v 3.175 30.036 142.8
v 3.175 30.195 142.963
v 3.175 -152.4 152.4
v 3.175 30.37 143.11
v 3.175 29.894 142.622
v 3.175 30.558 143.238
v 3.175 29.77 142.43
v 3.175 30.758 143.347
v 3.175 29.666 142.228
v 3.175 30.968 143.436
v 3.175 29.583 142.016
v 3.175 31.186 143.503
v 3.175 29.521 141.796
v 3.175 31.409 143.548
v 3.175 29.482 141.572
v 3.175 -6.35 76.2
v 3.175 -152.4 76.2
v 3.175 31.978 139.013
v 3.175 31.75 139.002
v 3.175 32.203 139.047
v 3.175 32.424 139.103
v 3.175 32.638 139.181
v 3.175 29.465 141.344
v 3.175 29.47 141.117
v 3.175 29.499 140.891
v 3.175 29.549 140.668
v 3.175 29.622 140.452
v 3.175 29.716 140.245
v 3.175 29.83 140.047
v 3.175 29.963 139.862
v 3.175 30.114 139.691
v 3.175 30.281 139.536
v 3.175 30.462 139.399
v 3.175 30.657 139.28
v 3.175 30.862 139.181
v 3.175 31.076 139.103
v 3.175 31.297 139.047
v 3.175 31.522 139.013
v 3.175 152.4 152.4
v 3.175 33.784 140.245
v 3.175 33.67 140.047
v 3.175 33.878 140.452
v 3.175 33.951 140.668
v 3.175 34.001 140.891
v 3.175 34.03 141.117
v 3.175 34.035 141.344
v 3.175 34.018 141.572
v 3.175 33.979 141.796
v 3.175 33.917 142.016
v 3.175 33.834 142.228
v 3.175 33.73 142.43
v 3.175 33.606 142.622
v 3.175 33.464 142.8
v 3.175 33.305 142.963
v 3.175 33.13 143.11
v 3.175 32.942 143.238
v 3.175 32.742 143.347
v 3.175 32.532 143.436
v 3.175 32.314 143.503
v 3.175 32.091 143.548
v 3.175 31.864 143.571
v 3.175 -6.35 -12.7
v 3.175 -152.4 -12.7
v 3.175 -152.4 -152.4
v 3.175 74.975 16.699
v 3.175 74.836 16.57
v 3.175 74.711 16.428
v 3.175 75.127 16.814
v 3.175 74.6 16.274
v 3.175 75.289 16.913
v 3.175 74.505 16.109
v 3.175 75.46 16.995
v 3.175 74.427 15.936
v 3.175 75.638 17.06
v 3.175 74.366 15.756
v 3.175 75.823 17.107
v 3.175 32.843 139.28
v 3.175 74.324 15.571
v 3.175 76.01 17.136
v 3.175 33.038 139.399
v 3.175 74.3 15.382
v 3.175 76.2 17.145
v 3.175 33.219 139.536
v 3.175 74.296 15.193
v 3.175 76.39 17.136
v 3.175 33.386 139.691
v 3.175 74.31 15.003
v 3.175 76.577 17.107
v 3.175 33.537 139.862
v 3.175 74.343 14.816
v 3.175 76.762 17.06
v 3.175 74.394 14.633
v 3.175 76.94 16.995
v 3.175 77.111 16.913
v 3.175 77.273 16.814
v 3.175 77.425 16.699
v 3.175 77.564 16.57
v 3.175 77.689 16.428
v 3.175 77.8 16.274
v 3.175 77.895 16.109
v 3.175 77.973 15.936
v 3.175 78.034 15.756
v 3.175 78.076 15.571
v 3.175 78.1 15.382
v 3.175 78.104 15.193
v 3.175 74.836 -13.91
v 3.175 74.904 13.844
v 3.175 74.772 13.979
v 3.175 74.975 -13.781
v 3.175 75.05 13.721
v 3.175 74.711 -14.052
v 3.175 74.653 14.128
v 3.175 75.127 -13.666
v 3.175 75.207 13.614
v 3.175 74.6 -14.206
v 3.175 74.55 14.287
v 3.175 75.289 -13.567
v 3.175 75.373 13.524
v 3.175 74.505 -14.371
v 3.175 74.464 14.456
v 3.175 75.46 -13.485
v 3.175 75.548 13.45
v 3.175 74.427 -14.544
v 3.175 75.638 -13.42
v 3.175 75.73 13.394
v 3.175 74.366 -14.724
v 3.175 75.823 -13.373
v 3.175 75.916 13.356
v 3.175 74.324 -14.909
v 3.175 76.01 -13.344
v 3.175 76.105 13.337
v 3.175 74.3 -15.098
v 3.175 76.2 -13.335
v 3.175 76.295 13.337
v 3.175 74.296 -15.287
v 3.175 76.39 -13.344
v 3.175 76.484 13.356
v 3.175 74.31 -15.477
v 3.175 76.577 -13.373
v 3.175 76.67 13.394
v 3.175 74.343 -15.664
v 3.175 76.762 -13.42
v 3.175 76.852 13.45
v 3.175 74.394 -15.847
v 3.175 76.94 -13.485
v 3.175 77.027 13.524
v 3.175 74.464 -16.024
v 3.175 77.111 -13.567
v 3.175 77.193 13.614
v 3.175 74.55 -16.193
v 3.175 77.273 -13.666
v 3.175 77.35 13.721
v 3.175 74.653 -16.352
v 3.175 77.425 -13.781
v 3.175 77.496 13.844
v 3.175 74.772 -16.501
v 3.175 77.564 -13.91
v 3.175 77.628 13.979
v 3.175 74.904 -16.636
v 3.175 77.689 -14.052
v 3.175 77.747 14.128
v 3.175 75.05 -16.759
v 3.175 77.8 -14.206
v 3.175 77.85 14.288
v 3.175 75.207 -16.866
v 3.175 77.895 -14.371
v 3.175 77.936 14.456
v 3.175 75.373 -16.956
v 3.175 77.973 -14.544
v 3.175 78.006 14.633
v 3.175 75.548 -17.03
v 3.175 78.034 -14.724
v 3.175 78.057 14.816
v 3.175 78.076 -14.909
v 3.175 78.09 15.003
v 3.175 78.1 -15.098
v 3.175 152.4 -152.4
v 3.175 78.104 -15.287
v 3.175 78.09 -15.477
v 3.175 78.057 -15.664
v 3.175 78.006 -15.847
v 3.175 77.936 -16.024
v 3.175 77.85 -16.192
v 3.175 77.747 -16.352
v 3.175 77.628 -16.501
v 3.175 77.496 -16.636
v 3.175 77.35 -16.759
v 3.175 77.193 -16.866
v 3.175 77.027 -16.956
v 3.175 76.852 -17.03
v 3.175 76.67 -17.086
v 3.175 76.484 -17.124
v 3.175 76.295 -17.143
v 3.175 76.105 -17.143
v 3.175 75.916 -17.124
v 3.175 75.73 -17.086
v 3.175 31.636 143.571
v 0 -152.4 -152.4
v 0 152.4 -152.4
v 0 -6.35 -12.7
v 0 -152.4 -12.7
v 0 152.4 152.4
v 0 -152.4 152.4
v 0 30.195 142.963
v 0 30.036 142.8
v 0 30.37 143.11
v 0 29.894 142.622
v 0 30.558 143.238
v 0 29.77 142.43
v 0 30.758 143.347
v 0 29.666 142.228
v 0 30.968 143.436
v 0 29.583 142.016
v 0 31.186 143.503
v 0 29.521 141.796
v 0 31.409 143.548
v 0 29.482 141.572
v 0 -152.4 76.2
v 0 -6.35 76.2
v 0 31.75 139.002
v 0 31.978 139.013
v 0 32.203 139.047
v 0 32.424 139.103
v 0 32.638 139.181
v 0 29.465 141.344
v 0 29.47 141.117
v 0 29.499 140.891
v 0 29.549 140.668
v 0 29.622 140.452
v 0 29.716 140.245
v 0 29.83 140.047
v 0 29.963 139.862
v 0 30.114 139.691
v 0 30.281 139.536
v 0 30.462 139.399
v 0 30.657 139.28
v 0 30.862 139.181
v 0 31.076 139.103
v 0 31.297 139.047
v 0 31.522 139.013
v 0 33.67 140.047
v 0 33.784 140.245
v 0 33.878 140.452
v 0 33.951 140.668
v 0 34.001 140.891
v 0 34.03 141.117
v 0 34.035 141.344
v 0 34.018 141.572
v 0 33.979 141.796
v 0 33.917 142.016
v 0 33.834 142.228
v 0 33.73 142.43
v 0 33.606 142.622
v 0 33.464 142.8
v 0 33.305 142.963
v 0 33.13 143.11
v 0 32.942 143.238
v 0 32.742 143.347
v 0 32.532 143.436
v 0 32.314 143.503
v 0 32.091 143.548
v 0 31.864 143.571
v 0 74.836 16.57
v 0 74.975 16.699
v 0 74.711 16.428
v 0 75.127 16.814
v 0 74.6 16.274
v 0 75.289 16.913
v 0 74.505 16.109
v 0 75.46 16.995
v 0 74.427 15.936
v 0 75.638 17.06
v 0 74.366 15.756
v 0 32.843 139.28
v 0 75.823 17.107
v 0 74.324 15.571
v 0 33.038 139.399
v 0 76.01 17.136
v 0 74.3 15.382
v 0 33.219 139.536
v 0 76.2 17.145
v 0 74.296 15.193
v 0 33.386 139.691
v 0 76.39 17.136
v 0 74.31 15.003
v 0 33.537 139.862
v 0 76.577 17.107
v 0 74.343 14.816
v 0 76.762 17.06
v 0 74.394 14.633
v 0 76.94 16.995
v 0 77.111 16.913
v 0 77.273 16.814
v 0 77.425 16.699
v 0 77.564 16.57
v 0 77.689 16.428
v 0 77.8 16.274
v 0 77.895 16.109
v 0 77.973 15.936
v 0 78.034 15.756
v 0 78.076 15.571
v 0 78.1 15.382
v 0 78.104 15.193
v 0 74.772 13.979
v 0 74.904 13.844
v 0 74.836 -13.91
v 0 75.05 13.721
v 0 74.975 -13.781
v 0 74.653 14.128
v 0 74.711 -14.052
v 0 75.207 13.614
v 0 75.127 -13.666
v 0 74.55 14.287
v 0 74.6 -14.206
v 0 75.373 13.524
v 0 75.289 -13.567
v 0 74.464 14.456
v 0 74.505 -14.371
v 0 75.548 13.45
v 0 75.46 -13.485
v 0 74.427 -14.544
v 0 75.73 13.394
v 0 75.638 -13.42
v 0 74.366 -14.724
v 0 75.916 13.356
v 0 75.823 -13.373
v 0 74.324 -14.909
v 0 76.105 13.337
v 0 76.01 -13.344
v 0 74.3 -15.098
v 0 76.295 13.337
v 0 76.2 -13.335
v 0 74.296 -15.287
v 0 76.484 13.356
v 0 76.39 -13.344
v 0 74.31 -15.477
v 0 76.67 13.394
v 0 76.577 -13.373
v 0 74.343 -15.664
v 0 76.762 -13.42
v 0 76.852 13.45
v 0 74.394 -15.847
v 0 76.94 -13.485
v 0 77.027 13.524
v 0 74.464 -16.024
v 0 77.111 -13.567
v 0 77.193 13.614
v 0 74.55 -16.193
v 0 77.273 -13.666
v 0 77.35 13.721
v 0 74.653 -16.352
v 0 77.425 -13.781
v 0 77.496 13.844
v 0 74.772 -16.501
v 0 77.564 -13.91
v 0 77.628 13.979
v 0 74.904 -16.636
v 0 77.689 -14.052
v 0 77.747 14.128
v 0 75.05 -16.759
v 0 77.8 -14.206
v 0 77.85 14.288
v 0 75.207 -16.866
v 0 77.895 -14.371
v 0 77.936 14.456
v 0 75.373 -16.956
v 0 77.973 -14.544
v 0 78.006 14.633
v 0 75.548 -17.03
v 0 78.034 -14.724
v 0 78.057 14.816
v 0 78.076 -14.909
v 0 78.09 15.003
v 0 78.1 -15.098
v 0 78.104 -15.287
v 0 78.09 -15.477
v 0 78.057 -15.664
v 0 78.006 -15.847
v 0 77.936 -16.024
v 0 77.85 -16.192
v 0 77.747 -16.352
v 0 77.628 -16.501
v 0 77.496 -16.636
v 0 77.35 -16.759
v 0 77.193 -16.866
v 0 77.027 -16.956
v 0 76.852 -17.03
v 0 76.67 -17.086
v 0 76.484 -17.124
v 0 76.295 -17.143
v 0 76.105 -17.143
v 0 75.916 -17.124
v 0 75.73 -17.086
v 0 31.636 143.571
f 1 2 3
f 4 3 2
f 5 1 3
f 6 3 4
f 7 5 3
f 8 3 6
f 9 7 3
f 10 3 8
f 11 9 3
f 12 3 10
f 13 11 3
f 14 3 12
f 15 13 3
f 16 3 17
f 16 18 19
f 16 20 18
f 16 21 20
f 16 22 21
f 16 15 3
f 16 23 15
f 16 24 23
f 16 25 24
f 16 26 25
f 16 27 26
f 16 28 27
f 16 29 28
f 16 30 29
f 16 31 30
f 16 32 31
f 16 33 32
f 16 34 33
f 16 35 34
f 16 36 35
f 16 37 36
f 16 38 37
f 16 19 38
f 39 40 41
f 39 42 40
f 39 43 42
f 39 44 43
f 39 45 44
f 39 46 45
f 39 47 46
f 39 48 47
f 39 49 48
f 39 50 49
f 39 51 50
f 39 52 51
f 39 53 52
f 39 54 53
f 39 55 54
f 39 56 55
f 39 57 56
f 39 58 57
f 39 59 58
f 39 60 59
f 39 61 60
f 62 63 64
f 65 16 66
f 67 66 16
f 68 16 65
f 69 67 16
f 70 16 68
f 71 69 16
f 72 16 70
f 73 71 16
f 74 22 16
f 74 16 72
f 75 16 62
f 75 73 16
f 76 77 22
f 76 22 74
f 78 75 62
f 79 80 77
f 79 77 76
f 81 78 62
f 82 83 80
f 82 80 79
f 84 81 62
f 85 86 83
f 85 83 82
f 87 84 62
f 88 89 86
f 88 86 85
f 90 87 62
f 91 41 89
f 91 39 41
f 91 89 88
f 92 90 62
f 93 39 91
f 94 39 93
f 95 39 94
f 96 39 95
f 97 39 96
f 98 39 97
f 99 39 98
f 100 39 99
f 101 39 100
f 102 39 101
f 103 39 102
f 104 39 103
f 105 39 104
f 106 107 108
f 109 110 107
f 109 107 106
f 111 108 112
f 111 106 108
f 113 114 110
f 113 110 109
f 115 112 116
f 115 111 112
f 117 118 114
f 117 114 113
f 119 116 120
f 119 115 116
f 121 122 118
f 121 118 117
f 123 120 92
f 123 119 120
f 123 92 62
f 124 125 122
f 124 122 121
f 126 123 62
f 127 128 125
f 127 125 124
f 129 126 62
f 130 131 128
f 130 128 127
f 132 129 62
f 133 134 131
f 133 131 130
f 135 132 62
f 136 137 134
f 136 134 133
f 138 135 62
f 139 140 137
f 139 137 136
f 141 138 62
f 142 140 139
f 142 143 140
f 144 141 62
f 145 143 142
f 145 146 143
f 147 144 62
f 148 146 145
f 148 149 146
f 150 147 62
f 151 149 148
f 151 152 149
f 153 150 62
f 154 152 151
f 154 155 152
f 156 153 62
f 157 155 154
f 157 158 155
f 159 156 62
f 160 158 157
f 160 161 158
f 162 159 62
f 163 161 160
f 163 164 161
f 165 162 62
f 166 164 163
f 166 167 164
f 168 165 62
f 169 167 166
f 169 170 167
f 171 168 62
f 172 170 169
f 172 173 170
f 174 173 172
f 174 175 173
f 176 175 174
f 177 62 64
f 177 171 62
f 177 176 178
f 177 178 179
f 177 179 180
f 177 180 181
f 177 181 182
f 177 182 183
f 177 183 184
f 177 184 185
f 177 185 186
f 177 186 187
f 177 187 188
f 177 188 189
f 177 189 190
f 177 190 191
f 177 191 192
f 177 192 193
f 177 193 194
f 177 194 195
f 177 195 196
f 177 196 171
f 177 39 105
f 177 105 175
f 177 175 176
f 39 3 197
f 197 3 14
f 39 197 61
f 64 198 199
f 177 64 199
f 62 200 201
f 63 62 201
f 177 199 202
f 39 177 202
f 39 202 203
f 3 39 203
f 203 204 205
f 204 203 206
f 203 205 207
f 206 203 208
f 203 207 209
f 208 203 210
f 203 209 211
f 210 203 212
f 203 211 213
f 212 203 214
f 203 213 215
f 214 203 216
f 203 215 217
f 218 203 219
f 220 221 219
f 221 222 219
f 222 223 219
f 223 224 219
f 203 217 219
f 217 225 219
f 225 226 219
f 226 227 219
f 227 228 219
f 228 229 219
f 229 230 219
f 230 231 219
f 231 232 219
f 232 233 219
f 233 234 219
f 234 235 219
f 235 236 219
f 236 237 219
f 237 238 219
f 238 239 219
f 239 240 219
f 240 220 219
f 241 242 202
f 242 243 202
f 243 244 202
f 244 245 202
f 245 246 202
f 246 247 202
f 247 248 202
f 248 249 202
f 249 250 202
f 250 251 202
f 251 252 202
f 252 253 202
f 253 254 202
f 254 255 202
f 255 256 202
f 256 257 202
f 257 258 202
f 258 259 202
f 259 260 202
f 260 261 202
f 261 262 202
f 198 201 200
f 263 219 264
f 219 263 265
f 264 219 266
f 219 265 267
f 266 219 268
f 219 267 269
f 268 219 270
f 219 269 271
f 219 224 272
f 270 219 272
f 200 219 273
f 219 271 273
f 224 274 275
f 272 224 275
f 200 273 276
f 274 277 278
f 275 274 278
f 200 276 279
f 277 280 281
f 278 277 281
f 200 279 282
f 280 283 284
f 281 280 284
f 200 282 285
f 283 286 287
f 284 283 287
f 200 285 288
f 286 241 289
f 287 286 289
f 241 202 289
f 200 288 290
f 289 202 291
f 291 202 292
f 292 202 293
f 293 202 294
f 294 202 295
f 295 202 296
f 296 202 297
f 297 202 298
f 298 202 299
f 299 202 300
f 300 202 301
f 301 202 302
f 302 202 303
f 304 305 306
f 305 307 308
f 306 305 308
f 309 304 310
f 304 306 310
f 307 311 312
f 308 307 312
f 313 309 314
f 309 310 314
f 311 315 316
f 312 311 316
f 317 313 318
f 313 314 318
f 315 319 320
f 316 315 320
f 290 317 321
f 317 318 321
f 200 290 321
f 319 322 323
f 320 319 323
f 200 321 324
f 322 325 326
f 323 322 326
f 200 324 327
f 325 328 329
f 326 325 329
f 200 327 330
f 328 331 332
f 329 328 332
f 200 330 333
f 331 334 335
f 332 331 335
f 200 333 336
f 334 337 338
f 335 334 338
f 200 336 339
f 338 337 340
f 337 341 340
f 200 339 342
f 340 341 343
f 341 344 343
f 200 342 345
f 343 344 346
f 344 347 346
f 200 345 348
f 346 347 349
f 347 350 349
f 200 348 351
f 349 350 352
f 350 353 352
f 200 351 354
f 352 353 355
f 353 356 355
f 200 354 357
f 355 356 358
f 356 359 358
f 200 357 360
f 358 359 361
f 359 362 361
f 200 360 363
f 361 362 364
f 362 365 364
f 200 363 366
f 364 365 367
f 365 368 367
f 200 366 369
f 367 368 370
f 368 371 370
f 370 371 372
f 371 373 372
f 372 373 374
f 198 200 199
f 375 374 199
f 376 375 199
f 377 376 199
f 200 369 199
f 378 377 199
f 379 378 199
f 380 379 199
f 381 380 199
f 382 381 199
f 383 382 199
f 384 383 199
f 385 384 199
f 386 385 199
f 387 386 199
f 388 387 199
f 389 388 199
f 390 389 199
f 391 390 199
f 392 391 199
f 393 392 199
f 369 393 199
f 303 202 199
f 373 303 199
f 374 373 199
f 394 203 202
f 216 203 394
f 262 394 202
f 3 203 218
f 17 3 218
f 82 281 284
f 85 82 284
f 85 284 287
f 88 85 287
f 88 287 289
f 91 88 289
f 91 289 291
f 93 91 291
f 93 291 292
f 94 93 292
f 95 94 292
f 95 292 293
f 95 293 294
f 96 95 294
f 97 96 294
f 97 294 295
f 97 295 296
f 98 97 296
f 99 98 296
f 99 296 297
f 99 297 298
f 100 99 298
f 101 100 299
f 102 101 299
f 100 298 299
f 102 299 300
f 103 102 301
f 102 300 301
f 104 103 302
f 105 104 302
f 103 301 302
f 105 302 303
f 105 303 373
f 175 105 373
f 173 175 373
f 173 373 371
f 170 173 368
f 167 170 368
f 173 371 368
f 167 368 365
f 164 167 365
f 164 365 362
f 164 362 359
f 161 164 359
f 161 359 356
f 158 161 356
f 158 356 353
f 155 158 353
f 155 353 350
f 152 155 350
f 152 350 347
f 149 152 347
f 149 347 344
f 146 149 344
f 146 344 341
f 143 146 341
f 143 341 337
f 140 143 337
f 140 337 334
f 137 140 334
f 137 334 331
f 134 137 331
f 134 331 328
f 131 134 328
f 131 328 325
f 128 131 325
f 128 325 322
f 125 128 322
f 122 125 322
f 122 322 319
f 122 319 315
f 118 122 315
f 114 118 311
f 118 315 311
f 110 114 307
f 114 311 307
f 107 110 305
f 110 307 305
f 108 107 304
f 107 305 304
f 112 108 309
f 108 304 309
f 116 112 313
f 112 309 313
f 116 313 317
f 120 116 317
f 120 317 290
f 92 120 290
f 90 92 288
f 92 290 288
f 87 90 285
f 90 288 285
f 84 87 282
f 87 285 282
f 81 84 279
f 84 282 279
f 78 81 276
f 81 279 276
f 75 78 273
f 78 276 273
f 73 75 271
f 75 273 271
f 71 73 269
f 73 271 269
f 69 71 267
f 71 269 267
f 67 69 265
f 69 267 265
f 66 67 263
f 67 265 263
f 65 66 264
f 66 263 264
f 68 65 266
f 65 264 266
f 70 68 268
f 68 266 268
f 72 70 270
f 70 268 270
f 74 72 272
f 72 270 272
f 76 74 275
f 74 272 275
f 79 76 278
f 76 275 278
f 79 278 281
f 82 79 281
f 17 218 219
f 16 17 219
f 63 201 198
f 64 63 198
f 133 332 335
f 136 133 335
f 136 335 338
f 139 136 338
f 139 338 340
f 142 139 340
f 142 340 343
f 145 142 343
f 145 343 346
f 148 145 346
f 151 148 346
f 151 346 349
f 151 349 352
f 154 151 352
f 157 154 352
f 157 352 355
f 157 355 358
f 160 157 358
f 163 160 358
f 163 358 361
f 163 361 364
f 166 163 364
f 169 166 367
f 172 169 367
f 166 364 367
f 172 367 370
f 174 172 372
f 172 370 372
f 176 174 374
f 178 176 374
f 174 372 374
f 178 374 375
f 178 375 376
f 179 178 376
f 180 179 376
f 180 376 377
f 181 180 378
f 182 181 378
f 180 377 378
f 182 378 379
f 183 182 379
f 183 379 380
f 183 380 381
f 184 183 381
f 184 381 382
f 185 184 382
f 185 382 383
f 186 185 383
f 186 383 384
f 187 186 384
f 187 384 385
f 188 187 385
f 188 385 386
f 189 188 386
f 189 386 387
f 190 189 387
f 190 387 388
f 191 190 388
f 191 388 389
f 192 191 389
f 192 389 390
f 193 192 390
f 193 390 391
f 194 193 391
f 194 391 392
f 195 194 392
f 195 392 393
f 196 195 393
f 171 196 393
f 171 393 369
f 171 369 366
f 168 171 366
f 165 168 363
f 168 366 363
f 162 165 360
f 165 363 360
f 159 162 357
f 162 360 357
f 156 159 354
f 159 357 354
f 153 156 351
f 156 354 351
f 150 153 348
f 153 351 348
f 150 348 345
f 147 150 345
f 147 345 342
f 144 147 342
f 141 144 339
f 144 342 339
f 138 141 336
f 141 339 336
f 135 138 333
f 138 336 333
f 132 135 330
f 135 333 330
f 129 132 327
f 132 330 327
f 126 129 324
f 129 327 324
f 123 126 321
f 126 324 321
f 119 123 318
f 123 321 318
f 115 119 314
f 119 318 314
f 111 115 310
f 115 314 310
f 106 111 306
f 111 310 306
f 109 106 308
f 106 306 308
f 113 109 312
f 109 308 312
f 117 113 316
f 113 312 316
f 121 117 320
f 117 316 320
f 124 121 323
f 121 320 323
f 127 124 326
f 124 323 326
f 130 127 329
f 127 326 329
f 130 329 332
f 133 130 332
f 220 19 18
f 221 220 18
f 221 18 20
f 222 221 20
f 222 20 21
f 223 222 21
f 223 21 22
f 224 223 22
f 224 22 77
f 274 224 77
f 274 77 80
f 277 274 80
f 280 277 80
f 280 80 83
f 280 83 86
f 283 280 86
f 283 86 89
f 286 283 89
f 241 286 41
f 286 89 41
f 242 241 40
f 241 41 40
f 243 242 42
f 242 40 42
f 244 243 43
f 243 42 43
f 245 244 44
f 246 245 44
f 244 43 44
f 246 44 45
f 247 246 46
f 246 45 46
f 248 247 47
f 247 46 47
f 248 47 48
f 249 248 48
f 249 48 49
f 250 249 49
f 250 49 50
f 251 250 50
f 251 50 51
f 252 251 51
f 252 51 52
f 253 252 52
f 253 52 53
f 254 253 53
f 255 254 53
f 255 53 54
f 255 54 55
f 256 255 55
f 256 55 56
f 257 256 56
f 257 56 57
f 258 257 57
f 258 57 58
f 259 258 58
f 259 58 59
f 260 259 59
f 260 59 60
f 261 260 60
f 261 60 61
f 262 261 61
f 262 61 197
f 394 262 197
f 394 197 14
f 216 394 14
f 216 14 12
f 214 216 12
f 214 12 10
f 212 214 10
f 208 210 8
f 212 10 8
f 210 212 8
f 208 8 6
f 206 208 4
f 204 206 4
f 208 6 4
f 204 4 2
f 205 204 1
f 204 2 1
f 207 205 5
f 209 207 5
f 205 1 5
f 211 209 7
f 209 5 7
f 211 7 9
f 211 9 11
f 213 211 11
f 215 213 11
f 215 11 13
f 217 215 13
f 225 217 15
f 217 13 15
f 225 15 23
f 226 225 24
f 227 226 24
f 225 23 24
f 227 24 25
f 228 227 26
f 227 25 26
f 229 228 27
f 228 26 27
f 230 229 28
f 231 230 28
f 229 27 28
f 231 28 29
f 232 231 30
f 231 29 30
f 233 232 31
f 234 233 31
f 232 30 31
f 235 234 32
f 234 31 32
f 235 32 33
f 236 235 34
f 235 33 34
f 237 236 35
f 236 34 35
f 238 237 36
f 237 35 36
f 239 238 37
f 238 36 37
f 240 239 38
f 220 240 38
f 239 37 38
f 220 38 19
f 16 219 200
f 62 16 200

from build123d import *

# Parameters (mm, degrees)
BOSS_EXTRUDE1_DEPTH       = 3.175
SKETCH2_R                 = 2.286
CUT_EXTRUDE1_DEPTH        = 216.549531721
F_6_0_15_DIAMETER_HOLE1_D = 3.81


with BuildPart() as part:
    # Sketch1 → Boss-Extrude1 (new body)
    with BuildSketch(Plane(origin=(0, 0, 0), x_dir=(0, 0, -1), z_dir=(1, 0, 0))):
        Polygon((152.4, 152.4), (-152.4, 152.4), (-152.4, -152.4), (-76.2, -152.4), (-76.2, -6.35), (12.7, -6.35), (12.7, -152.4), (152.4, -152.4), align=None)
    extrude(amount=BOSS_EXTRUDE1_DEPTH)

    # Sketch2 → Cut-Extrude1 (cut, through all)
    with BuildSketch(Plane(origin=(3.175, 0, 0), x_dir=(0, 0, -1), z_dir=(1, 0, 0))):
        with Locations((-141.2875, 31.75)):
            Circle(SKETCH2_R)
    extrude(amount=-CUT_EXTRUDE1_DEPTH, mode=Mode.SUBTRACT)

    # #6 (0.15) Diameter Hole1 (through all)
    with Locations(Plane(origin=(3.175, 0, 0), x_dir=(0, 0, -1), z_dir=(1, 0, 0))):
        with Locations((-15.24, 76.2), (15.24, 76.2)):
            Hole(F_6_0_15_DIAMETER_HOLE1_D / 2)


solid = part.part
